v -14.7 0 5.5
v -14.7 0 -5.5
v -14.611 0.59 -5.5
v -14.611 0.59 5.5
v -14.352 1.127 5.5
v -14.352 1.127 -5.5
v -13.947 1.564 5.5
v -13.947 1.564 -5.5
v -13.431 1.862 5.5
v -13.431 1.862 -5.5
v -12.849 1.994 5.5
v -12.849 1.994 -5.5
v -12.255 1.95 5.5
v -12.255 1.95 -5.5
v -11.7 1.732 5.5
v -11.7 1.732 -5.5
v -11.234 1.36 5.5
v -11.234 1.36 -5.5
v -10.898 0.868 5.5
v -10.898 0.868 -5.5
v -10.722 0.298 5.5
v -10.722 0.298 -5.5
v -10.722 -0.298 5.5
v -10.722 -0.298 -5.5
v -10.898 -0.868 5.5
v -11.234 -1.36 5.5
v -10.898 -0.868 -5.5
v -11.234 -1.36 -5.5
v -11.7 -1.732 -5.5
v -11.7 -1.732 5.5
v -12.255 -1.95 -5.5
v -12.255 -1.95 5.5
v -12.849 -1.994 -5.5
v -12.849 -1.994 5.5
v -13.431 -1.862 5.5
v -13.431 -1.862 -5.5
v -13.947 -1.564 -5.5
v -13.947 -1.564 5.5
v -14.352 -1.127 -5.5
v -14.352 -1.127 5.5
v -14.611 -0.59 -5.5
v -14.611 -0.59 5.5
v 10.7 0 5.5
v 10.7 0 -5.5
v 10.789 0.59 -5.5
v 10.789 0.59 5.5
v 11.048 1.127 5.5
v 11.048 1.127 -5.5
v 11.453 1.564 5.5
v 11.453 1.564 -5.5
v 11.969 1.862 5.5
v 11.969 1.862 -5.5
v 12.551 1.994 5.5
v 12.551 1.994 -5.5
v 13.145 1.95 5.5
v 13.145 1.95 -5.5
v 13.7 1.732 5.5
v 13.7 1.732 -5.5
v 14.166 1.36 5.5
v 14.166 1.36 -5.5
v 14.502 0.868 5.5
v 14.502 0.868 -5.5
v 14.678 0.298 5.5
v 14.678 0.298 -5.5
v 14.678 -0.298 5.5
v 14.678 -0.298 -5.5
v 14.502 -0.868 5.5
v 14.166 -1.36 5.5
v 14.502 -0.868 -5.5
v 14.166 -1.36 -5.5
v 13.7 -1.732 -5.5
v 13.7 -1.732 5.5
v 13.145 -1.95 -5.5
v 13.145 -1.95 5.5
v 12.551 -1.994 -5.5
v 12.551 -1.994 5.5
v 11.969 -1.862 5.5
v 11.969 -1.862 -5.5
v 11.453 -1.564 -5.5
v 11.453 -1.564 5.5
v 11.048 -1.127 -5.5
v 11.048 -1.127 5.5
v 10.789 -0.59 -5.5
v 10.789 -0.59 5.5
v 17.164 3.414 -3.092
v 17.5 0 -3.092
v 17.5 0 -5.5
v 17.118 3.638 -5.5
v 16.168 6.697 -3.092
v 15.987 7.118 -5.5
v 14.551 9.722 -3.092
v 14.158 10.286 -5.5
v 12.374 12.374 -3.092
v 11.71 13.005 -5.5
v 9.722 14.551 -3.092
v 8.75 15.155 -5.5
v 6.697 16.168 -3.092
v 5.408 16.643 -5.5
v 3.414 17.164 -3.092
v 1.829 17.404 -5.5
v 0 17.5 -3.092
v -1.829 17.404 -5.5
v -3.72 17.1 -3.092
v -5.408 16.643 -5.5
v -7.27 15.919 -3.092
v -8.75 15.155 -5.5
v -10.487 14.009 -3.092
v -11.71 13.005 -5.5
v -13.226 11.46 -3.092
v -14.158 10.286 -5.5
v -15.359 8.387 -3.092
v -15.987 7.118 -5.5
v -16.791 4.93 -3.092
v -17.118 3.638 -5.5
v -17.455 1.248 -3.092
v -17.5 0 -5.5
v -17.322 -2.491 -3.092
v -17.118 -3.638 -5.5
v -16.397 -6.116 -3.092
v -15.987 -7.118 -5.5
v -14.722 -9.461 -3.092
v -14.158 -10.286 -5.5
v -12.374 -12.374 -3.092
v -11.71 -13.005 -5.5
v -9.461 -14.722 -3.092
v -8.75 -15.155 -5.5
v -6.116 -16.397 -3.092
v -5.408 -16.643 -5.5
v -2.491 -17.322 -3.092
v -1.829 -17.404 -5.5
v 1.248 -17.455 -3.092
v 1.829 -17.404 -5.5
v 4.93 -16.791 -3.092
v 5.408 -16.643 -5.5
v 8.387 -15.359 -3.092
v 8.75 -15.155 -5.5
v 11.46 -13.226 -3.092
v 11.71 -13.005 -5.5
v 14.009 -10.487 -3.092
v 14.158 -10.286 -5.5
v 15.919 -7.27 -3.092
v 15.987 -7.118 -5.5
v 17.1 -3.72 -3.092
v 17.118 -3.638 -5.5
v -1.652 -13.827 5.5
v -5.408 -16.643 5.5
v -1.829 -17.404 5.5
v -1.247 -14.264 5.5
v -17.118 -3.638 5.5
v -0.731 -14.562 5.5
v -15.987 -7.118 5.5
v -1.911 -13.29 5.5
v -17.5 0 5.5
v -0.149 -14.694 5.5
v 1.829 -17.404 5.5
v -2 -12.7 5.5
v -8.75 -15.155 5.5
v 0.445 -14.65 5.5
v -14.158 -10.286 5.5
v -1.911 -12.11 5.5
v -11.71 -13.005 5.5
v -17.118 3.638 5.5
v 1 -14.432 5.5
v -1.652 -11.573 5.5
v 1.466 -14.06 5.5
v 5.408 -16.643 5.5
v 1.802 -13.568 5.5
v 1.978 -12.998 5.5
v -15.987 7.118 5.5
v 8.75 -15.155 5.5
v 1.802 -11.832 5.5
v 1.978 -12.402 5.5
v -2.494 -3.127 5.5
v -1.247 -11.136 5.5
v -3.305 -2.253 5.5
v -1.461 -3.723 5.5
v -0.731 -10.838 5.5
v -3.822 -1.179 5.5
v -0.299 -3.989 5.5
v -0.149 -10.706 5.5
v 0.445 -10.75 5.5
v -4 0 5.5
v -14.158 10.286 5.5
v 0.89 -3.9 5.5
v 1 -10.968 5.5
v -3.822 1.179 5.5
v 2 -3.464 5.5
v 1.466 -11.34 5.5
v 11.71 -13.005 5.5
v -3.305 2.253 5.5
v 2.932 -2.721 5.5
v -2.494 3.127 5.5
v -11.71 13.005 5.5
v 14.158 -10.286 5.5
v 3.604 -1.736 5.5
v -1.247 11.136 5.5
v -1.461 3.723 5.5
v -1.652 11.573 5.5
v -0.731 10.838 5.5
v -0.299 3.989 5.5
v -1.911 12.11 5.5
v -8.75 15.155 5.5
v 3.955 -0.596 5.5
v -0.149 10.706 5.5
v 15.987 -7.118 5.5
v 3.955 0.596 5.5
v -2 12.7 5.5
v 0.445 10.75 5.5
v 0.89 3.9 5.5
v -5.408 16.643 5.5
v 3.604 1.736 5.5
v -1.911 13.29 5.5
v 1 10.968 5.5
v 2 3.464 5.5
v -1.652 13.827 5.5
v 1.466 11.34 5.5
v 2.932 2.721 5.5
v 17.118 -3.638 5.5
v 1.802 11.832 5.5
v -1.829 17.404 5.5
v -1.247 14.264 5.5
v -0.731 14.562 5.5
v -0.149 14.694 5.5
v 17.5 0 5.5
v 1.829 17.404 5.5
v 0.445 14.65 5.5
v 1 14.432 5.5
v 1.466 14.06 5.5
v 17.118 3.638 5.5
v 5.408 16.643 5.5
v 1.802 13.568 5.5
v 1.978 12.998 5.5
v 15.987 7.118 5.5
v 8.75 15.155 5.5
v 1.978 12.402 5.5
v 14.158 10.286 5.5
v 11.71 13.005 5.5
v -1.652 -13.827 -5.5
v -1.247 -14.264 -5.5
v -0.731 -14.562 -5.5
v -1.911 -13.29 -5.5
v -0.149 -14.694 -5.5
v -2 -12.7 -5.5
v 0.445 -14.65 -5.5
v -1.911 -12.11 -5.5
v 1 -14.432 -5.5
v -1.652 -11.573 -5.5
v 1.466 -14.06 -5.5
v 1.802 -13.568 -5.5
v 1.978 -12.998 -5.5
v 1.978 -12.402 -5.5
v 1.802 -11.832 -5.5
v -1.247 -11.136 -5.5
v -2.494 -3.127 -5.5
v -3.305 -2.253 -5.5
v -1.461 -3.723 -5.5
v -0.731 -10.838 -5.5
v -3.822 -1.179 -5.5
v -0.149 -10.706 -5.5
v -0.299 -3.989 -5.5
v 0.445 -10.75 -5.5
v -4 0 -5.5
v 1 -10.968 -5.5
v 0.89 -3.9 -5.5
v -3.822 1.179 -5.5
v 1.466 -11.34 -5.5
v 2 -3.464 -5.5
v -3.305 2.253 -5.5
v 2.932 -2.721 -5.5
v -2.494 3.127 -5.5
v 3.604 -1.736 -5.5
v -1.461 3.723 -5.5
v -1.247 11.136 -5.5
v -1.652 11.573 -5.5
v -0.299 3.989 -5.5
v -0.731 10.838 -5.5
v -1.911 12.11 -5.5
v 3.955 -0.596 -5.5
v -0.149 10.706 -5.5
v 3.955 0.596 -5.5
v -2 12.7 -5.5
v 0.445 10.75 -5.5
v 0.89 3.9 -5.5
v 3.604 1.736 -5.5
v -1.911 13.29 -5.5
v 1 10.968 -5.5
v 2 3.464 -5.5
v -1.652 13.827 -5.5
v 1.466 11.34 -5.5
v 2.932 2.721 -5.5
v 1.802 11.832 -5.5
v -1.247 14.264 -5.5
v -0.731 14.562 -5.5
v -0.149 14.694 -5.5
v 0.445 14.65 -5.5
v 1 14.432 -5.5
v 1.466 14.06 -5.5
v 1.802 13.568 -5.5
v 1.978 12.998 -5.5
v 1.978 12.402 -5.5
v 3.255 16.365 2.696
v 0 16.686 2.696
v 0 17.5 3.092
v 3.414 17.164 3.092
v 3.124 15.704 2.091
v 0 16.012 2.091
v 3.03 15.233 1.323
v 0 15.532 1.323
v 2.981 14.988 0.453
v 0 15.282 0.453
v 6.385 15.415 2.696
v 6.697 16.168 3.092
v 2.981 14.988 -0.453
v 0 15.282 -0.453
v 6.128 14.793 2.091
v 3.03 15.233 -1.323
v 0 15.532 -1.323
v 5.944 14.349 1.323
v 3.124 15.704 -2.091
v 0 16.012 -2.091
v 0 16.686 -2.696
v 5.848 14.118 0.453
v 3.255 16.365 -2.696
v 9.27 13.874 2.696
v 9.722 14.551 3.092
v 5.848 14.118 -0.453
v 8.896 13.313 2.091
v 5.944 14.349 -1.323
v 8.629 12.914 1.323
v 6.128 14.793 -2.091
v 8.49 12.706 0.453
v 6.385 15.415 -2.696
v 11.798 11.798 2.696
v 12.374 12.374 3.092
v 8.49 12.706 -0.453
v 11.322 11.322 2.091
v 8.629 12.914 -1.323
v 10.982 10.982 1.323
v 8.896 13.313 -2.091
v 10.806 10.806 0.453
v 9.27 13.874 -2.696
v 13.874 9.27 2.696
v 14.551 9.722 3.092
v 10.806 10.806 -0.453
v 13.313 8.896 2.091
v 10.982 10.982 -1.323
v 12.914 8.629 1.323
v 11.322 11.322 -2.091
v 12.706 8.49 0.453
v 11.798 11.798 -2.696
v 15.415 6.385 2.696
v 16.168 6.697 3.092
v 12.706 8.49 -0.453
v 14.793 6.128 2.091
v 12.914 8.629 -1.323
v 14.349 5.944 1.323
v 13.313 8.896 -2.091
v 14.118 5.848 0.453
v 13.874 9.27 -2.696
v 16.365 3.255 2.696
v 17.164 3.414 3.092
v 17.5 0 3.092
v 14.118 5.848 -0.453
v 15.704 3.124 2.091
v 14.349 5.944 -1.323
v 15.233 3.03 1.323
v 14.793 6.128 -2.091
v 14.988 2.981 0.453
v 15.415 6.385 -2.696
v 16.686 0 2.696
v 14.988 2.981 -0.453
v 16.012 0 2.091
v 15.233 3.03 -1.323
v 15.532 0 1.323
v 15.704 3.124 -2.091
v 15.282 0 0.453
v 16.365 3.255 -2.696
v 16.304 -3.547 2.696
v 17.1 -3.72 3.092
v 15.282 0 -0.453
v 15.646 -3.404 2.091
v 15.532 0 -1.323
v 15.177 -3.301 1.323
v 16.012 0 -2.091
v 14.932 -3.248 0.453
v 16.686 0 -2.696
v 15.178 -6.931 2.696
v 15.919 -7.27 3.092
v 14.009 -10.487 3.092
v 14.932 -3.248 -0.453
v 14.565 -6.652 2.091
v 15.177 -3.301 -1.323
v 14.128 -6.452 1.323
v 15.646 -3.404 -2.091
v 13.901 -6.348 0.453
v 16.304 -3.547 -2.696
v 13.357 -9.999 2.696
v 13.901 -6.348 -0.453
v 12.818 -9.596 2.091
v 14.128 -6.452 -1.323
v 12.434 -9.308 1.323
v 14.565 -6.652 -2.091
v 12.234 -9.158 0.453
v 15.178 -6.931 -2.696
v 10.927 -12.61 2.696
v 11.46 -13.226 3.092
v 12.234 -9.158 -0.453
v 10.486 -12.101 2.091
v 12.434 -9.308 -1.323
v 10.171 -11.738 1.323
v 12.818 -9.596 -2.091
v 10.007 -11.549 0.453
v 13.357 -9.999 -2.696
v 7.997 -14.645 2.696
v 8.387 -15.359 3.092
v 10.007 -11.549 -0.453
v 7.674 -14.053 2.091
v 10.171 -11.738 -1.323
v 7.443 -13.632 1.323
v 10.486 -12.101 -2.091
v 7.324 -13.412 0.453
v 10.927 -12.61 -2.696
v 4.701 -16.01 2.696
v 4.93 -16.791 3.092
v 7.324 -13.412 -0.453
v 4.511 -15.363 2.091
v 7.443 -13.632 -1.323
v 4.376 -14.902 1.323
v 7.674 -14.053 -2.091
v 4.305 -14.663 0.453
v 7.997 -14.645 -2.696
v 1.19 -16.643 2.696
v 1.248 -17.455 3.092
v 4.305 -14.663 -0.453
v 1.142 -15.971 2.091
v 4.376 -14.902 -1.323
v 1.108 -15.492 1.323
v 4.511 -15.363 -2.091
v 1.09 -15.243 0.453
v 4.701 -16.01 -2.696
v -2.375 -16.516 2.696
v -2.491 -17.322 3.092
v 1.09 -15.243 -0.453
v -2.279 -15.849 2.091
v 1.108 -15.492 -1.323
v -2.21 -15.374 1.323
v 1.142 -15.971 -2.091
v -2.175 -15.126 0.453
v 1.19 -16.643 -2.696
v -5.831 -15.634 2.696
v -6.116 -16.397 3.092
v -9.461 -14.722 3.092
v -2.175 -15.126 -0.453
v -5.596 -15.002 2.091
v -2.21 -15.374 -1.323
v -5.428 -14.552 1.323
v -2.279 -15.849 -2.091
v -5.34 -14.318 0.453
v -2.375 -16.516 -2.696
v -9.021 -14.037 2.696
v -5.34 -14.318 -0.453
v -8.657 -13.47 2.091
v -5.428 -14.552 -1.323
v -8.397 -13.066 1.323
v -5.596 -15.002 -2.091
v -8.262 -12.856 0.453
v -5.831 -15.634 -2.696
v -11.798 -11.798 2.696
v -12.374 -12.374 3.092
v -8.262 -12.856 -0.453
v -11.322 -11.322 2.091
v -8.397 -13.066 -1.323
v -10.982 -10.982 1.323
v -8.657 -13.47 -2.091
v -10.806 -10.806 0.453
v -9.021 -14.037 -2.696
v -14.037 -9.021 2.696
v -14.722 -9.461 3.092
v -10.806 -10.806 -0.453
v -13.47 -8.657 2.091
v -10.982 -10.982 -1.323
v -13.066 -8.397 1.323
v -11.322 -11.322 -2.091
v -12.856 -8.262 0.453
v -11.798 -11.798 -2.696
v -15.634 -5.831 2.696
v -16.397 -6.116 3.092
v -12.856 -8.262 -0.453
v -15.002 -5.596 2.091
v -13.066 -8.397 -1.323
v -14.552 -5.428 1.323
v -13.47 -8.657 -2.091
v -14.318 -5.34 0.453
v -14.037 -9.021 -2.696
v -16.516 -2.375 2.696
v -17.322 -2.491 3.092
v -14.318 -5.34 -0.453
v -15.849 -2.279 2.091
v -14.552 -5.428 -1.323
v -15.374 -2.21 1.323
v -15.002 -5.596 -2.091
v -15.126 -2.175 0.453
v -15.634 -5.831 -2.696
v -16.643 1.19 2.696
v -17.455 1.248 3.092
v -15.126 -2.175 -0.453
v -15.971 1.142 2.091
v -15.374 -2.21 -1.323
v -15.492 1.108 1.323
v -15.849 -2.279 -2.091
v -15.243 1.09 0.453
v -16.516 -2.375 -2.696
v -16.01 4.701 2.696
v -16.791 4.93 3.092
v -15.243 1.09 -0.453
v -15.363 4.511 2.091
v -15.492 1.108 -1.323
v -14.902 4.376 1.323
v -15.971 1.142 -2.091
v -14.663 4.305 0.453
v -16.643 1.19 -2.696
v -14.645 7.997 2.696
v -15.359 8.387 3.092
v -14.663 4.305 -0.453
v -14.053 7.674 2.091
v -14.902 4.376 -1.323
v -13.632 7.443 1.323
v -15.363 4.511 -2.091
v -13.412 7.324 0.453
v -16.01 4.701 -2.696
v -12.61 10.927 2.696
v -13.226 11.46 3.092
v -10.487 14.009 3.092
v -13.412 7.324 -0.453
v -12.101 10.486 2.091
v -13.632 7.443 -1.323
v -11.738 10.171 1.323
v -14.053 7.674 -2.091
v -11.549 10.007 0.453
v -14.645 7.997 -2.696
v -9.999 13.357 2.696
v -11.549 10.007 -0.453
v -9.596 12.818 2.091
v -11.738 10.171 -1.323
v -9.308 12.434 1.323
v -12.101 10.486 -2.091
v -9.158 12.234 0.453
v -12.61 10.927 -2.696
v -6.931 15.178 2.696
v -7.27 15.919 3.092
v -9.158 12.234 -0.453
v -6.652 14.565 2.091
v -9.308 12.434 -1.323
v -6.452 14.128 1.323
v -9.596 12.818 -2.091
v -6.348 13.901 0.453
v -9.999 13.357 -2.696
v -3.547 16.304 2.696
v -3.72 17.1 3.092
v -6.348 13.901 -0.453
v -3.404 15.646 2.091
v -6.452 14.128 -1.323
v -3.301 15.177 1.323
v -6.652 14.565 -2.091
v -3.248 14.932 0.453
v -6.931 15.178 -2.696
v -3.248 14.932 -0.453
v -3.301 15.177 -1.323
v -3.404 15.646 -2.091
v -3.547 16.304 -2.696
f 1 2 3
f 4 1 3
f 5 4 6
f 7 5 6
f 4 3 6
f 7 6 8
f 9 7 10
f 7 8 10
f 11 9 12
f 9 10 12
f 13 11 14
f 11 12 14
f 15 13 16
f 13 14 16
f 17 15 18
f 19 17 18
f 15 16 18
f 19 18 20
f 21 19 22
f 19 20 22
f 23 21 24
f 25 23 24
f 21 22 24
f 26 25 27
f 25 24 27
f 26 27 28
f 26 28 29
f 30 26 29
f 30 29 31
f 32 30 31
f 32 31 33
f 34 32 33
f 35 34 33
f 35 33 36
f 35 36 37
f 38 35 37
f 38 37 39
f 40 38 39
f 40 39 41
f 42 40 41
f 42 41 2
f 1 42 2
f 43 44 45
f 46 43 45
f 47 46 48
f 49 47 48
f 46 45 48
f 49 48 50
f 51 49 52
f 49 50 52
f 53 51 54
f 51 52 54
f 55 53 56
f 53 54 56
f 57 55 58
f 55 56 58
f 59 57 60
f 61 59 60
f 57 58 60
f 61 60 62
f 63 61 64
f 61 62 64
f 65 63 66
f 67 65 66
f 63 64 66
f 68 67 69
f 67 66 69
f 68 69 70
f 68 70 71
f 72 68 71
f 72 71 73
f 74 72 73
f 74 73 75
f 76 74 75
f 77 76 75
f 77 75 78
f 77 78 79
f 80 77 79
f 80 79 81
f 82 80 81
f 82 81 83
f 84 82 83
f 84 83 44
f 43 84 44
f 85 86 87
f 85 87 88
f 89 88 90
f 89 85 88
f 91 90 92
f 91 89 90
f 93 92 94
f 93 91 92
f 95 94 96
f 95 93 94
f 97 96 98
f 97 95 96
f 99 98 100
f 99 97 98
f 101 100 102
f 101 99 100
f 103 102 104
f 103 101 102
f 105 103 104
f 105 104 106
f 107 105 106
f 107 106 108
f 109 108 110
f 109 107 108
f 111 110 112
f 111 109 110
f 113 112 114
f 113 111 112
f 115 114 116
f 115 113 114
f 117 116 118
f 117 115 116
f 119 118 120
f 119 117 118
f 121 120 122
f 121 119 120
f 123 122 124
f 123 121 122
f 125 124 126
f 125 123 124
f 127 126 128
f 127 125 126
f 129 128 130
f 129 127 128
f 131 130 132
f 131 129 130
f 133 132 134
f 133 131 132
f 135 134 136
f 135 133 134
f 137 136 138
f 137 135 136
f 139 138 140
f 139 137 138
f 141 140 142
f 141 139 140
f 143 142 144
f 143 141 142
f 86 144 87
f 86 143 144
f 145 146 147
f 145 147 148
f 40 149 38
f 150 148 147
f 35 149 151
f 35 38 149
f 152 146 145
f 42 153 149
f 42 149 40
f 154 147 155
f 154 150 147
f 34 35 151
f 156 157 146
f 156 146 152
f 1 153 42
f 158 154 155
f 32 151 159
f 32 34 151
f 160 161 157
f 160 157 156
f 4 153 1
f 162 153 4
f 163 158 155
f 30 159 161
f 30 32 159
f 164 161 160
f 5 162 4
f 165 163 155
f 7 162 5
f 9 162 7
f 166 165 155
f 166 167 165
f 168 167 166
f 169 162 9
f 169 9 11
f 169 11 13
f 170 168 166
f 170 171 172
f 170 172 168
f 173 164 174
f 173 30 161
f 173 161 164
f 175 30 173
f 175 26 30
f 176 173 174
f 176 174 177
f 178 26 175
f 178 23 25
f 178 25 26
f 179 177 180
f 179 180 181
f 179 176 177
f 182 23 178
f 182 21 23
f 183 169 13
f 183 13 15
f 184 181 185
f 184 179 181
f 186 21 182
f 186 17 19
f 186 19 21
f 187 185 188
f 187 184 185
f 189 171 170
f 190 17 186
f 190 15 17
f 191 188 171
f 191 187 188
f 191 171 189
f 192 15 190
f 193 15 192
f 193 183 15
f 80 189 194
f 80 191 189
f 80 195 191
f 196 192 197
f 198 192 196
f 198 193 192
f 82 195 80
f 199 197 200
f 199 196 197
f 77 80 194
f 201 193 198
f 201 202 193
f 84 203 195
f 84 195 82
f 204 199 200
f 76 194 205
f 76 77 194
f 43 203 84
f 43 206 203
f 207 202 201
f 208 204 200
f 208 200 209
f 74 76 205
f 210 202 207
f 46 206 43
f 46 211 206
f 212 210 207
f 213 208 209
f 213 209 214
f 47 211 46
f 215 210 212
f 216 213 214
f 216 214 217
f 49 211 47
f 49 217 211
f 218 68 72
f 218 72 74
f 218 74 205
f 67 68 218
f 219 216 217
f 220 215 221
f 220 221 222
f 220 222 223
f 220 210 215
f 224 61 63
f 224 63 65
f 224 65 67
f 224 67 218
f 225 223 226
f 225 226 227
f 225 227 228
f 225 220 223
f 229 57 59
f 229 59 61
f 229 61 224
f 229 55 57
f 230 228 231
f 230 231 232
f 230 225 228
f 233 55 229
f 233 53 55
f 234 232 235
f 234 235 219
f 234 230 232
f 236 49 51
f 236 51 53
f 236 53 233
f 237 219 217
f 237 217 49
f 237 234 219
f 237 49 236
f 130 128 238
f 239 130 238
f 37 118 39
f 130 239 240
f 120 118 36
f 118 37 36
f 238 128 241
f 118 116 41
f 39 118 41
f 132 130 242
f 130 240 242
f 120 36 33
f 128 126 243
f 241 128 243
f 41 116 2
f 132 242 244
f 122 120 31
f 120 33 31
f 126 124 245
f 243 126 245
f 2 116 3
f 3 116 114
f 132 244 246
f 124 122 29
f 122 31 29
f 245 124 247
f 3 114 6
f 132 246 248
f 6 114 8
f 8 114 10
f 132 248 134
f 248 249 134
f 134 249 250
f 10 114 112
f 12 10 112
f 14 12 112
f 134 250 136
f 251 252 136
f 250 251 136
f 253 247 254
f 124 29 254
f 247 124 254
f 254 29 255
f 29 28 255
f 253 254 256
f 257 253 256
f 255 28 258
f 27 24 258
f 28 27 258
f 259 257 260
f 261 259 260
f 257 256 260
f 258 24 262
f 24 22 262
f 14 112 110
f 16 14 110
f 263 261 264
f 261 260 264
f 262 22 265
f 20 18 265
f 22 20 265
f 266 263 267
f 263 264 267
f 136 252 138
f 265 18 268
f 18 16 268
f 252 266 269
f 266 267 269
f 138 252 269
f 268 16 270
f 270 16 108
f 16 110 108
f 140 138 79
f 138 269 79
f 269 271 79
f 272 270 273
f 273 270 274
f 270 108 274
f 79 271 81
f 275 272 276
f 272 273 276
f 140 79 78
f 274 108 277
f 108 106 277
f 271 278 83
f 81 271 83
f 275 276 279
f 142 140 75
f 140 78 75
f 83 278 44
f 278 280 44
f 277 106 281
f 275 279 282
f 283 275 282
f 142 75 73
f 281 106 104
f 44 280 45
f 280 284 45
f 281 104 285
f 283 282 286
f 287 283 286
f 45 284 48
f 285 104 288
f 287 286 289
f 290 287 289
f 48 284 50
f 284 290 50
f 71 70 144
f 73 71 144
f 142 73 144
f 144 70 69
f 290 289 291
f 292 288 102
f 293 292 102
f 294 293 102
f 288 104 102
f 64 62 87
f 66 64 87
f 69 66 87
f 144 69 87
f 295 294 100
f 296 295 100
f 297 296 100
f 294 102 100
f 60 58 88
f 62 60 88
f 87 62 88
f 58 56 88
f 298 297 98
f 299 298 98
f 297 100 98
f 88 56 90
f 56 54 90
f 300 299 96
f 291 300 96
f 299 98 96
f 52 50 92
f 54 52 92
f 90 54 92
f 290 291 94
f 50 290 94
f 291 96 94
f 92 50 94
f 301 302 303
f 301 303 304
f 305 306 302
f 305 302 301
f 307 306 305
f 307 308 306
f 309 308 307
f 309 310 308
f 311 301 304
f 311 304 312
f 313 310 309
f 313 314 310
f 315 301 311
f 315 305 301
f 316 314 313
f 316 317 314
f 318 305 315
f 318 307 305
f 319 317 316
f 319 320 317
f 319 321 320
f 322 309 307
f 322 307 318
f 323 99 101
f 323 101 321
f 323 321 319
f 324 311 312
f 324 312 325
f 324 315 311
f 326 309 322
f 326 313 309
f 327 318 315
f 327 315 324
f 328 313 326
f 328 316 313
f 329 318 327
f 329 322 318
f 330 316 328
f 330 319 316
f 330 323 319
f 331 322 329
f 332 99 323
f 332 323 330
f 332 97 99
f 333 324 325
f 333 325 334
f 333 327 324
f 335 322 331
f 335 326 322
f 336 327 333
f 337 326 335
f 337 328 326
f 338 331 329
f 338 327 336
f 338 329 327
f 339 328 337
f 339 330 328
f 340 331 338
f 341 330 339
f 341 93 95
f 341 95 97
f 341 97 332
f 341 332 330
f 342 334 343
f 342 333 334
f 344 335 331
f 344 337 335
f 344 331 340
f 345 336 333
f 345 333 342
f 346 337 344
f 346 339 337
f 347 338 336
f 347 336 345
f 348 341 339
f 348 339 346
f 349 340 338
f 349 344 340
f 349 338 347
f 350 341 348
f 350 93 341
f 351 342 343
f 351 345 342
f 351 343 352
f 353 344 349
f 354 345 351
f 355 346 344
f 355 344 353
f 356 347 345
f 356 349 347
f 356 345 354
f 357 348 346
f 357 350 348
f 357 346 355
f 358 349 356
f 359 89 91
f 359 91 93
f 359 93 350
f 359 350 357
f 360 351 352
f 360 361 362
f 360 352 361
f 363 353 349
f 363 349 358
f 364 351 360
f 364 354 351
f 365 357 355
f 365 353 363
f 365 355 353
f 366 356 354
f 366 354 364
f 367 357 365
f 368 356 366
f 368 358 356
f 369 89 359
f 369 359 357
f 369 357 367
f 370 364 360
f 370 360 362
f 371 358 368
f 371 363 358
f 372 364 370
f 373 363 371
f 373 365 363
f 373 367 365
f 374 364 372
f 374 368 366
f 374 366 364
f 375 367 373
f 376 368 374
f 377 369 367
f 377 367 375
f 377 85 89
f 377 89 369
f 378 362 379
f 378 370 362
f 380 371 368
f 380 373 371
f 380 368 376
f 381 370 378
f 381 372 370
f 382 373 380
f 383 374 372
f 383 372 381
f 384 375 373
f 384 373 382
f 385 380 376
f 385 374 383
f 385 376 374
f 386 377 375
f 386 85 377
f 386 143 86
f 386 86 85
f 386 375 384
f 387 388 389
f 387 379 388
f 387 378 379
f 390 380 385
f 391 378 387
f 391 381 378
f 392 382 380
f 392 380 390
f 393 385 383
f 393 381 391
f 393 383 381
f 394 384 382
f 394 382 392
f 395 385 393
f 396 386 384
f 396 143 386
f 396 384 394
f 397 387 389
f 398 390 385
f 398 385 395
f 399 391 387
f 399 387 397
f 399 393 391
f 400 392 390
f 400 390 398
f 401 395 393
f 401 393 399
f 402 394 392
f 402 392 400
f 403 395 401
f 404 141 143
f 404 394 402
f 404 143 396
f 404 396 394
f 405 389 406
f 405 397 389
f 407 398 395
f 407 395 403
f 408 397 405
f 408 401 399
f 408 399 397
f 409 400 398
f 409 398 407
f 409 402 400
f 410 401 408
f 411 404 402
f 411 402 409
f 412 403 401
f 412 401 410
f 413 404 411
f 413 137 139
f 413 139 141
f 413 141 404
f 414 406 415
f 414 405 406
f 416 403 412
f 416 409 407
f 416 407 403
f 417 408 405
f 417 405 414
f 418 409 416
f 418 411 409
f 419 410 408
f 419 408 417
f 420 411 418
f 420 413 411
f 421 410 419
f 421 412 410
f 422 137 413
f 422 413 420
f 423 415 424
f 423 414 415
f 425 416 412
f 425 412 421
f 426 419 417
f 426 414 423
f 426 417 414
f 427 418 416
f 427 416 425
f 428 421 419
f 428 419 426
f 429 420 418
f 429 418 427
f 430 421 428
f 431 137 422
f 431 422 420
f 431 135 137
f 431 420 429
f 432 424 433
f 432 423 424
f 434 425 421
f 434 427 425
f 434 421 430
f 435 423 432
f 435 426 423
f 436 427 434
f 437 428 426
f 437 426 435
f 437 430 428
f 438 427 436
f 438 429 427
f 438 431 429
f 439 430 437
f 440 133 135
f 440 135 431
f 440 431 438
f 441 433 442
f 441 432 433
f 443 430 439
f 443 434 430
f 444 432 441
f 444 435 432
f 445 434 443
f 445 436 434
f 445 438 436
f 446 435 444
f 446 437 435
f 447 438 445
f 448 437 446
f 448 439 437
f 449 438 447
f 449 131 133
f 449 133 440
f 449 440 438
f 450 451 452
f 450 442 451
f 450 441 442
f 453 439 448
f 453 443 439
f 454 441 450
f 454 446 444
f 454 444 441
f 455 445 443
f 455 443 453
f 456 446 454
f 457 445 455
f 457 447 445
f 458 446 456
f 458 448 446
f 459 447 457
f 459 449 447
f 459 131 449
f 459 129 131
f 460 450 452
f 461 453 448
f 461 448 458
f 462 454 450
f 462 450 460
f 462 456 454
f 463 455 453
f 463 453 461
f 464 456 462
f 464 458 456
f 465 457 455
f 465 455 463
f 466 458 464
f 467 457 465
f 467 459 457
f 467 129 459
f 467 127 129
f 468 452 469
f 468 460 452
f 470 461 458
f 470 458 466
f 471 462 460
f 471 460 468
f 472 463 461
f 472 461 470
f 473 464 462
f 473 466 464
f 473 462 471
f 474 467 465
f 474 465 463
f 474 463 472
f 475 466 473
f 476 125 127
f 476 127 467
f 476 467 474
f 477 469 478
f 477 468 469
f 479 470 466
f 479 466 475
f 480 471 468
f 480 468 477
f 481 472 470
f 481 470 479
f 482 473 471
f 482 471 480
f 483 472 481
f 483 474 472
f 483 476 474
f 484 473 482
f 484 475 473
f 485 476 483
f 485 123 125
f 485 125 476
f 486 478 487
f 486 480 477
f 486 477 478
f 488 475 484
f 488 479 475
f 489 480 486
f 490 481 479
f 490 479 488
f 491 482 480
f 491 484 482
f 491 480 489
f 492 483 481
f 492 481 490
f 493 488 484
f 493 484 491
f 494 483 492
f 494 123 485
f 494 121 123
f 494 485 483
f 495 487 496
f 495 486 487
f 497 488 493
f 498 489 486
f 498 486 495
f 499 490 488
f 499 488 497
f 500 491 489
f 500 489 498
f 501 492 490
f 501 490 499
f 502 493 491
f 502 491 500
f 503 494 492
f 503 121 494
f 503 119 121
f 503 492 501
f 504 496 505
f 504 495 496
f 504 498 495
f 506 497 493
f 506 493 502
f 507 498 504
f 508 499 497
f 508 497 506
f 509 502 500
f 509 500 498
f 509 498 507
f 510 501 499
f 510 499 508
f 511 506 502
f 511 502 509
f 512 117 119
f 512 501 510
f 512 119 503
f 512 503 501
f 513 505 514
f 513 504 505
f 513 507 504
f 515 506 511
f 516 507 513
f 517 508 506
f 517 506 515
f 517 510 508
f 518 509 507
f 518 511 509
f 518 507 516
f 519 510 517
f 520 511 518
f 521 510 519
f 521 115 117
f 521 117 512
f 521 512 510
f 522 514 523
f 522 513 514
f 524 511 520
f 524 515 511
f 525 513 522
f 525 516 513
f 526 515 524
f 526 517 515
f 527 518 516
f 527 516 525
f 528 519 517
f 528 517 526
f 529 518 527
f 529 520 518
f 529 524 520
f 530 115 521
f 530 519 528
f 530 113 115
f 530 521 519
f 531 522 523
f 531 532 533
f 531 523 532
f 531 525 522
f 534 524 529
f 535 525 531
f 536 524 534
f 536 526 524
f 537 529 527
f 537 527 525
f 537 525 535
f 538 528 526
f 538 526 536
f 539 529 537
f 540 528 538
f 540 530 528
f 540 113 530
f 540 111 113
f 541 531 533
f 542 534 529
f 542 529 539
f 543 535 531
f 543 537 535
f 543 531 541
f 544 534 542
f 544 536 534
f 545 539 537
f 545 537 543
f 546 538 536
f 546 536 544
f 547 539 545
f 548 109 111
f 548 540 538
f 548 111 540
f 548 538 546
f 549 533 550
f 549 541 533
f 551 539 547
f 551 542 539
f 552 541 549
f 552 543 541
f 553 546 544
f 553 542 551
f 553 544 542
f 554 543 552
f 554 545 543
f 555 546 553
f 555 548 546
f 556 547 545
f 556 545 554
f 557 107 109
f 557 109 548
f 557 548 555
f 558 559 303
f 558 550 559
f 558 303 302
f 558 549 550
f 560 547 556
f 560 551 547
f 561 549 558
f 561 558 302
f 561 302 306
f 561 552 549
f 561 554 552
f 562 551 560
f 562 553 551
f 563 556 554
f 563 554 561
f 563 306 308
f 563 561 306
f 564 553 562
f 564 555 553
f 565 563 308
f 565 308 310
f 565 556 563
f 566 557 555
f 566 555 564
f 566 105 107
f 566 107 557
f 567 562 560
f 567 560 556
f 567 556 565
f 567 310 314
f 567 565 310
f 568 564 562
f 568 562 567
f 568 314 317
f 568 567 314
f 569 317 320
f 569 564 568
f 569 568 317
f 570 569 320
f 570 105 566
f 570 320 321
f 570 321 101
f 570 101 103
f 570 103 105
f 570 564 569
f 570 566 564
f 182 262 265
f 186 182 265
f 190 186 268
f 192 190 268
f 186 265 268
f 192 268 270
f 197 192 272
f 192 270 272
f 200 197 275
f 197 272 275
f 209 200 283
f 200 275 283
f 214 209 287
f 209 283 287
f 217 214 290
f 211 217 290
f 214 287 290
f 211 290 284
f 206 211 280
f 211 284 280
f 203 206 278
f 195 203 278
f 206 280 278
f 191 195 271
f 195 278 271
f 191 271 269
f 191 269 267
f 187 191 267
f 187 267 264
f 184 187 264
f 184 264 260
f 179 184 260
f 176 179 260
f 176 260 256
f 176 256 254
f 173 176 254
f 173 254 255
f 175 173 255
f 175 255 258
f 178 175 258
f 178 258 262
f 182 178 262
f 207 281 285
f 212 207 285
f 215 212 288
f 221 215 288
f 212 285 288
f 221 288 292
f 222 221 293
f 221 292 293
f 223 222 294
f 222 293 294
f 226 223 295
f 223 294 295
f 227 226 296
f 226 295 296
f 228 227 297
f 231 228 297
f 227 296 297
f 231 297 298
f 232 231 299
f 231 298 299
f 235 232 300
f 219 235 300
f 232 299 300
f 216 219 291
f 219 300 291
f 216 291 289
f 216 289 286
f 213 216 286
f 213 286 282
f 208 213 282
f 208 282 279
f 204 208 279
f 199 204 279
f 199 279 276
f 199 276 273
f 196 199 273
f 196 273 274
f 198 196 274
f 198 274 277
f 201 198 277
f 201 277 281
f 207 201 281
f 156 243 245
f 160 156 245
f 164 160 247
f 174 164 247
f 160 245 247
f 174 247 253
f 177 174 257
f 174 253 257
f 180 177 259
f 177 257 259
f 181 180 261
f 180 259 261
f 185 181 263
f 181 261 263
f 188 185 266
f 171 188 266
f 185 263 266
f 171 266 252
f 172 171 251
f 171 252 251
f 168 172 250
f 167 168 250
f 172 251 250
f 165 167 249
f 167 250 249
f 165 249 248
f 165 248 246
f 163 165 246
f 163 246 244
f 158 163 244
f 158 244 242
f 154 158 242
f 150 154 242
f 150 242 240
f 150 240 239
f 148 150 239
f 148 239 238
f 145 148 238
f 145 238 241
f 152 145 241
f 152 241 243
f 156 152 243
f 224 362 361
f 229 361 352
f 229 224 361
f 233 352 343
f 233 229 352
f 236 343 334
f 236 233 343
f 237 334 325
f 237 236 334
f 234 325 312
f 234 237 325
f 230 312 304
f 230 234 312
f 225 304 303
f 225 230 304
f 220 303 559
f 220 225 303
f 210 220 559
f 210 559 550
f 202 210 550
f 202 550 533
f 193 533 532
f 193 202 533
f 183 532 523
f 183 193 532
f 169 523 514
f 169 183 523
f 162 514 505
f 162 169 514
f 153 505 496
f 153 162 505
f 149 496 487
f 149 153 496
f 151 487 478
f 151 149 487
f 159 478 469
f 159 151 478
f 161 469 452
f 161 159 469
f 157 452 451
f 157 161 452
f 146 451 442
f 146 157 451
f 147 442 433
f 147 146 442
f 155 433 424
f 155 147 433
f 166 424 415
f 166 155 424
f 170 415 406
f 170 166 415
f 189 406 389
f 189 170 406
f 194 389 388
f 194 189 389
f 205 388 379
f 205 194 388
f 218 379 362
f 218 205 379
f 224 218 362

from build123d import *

# Parameters (mm, degrees)
SKETCH1_R             = 17.5
BOSS_EXTRUDE1_DEPTH   = 5.5
SKETCH2_R             = 3.25
F_8_0MM_DOWEL_HOLE1_D = 8
F_4_0MM_DOWEL_HOLE1_D = 4


with BuildPart() as part:
    # Sketch1 → Boss-Extrude1 (new body, symmetric)
    with BuildSketch(Plane.XY):
        Circle(SKETCH1_R)
    extrude(amount=BOSS_EXTRUDE1_DEPTH, both=True)

    # Sketch2 → Cut-Revolve1 (revolve, cut)
    with BuildSketch(Plane(origin=(0, 0, 0), x_dir=(0, 0, -1), z_dir=(1, 0, 0))):
        with Locations((0, 18.5)):
            Circle(SKETCH2_R)
    revolve(axis=Axis((0, 0, 0), (0, 0, -1)), mode=Mode.SUBTRACT)

    # Ø8.0mm Dowel Hole1 (through all)
    with Locations(Plane.XY.offset(5.5)):
        with Locations((0, 0)):
            Hole(F_8_0MM_DOWEL_HOLE1_D / 2)

    # Ø4.0mm Dowel Hole1 (through all)
    with Locations(Plane.XY.offset(5.5)):
        with Locations((0, 12.7), (12.7, 0), (0, -12.7), (-12.7, 0)):
            Hole(F_4_0MM_DOWEL_HOLE1_D / 2)


solid = part.part
